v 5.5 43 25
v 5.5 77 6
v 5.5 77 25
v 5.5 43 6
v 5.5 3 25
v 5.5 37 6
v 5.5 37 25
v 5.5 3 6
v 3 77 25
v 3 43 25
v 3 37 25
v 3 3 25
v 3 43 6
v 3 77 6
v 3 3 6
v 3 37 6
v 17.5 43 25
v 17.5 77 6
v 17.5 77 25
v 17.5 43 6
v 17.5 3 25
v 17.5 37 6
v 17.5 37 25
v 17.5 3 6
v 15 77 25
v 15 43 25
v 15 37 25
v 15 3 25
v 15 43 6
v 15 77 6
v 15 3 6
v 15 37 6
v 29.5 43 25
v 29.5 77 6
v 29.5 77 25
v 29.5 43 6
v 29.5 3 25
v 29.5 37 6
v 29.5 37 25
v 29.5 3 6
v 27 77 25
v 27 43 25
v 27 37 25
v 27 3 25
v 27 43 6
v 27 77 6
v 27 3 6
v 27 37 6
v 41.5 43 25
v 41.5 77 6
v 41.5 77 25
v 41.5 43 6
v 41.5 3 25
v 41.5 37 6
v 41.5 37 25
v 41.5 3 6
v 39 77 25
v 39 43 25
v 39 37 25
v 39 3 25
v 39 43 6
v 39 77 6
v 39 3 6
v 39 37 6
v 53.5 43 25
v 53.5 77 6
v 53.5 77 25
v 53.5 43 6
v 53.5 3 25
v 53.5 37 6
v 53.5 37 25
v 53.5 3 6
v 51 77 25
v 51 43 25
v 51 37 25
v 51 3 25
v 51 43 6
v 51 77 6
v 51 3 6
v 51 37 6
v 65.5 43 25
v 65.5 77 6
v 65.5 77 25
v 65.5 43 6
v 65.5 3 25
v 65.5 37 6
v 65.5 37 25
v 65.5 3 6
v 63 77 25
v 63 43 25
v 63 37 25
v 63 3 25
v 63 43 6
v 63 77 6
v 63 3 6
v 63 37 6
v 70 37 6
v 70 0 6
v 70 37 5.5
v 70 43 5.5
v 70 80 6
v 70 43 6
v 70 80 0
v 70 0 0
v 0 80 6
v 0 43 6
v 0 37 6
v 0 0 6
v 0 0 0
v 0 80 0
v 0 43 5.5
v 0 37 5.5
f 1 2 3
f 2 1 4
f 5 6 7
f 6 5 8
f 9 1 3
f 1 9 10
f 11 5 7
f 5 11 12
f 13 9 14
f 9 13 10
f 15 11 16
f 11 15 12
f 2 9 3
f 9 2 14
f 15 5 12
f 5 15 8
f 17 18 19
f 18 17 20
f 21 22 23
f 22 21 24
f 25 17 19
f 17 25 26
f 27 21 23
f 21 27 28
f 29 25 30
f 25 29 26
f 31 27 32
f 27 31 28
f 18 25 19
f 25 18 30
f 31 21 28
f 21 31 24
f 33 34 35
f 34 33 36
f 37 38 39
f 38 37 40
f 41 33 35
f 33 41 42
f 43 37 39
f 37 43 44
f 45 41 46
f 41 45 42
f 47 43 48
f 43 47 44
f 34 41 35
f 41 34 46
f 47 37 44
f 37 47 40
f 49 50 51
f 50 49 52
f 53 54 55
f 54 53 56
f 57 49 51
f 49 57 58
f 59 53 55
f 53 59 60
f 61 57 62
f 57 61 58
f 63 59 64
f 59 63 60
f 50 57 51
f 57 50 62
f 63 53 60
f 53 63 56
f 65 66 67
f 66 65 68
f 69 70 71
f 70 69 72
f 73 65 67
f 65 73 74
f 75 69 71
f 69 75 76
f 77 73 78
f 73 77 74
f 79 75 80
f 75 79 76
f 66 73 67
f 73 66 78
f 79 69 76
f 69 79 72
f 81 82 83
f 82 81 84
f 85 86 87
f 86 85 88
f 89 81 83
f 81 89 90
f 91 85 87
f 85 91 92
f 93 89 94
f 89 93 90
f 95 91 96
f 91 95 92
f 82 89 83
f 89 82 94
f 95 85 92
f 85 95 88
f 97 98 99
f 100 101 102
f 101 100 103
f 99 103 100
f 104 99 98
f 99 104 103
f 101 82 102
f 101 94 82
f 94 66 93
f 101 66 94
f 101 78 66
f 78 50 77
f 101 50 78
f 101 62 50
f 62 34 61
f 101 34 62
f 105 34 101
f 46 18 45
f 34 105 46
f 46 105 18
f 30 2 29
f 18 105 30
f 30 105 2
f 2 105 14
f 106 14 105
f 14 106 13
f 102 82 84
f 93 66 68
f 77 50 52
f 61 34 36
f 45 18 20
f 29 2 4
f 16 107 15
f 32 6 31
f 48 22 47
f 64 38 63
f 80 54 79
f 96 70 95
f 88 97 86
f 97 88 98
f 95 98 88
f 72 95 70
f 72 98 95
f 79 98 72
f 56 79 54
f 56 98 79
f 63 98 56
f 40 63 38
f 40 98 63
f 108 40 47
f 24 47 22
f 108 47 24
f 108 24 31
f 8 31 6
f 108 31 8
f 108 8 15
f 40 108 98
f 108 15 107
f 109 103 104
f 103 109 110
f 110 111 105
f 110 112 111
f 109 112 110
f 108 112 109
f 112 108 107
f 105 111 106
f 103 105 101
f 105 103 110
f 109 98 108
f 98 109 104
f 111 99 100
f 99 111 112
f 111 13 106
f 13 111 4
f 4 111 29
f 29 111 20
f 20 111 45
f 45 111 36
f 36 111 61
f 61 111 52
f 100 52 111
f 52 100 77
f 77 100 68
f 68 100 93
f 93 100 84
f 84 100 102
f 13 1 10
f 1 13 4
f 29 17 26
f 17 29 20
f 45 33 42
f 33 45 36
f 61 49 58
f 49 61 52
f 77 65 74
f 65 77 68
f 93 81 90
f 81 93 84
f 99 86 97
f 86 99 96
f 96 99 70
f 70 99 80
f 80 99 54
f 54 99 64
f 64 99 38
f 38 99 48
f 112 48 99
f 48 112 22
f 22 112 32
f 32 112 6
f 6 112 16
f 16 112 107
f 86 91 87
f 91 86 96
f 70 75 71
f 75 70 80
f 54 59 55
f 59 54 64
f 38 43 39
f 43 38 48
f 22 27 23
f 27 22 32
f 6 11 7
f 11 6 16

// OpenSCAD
$fn = 32;

// ----------------------------------------------------------------------
// Heatsink: slotted fin block
// ----------------------------------------------------------------------

// --- parameters (mm) ---
base_l = 70;              // base length, X
base_w = 80;              // base width, Y
base_t = 6;               // base plate thickness
fin_h = 20;               // fin height above the base
fin_t = 2.5;              // fin thickness
edge = 3;                 // margin from the base ends
pitch = 12;               // fin pitch
slot_w = 6;               // central slot width, Y
fit_tol = 0.02;           // tolerance for press fits, mm
free_tol = 0.2;           // tolerance for clearance fits, mm

n_fins = floor((base_l - 2 * edge - fin_t) / pitch) + 1;  // fin count
total_h = base_t + fin_h - 1;  // overall height

difference() {
union() {
  cube([base_l, base_w, base_t]);
  for (i = [0 : n_fins - 1])
    translate([edge + i * pitch, edge, base_t - 1])
      cube([fin_t, base_w - 2 * edge, fin_h]);
}
  translate([-1, base_w / 2 - slot_w / 2, base_t - 0.5])
    cube([base_l + 2, slot_w, fin_h + 2]);
}
